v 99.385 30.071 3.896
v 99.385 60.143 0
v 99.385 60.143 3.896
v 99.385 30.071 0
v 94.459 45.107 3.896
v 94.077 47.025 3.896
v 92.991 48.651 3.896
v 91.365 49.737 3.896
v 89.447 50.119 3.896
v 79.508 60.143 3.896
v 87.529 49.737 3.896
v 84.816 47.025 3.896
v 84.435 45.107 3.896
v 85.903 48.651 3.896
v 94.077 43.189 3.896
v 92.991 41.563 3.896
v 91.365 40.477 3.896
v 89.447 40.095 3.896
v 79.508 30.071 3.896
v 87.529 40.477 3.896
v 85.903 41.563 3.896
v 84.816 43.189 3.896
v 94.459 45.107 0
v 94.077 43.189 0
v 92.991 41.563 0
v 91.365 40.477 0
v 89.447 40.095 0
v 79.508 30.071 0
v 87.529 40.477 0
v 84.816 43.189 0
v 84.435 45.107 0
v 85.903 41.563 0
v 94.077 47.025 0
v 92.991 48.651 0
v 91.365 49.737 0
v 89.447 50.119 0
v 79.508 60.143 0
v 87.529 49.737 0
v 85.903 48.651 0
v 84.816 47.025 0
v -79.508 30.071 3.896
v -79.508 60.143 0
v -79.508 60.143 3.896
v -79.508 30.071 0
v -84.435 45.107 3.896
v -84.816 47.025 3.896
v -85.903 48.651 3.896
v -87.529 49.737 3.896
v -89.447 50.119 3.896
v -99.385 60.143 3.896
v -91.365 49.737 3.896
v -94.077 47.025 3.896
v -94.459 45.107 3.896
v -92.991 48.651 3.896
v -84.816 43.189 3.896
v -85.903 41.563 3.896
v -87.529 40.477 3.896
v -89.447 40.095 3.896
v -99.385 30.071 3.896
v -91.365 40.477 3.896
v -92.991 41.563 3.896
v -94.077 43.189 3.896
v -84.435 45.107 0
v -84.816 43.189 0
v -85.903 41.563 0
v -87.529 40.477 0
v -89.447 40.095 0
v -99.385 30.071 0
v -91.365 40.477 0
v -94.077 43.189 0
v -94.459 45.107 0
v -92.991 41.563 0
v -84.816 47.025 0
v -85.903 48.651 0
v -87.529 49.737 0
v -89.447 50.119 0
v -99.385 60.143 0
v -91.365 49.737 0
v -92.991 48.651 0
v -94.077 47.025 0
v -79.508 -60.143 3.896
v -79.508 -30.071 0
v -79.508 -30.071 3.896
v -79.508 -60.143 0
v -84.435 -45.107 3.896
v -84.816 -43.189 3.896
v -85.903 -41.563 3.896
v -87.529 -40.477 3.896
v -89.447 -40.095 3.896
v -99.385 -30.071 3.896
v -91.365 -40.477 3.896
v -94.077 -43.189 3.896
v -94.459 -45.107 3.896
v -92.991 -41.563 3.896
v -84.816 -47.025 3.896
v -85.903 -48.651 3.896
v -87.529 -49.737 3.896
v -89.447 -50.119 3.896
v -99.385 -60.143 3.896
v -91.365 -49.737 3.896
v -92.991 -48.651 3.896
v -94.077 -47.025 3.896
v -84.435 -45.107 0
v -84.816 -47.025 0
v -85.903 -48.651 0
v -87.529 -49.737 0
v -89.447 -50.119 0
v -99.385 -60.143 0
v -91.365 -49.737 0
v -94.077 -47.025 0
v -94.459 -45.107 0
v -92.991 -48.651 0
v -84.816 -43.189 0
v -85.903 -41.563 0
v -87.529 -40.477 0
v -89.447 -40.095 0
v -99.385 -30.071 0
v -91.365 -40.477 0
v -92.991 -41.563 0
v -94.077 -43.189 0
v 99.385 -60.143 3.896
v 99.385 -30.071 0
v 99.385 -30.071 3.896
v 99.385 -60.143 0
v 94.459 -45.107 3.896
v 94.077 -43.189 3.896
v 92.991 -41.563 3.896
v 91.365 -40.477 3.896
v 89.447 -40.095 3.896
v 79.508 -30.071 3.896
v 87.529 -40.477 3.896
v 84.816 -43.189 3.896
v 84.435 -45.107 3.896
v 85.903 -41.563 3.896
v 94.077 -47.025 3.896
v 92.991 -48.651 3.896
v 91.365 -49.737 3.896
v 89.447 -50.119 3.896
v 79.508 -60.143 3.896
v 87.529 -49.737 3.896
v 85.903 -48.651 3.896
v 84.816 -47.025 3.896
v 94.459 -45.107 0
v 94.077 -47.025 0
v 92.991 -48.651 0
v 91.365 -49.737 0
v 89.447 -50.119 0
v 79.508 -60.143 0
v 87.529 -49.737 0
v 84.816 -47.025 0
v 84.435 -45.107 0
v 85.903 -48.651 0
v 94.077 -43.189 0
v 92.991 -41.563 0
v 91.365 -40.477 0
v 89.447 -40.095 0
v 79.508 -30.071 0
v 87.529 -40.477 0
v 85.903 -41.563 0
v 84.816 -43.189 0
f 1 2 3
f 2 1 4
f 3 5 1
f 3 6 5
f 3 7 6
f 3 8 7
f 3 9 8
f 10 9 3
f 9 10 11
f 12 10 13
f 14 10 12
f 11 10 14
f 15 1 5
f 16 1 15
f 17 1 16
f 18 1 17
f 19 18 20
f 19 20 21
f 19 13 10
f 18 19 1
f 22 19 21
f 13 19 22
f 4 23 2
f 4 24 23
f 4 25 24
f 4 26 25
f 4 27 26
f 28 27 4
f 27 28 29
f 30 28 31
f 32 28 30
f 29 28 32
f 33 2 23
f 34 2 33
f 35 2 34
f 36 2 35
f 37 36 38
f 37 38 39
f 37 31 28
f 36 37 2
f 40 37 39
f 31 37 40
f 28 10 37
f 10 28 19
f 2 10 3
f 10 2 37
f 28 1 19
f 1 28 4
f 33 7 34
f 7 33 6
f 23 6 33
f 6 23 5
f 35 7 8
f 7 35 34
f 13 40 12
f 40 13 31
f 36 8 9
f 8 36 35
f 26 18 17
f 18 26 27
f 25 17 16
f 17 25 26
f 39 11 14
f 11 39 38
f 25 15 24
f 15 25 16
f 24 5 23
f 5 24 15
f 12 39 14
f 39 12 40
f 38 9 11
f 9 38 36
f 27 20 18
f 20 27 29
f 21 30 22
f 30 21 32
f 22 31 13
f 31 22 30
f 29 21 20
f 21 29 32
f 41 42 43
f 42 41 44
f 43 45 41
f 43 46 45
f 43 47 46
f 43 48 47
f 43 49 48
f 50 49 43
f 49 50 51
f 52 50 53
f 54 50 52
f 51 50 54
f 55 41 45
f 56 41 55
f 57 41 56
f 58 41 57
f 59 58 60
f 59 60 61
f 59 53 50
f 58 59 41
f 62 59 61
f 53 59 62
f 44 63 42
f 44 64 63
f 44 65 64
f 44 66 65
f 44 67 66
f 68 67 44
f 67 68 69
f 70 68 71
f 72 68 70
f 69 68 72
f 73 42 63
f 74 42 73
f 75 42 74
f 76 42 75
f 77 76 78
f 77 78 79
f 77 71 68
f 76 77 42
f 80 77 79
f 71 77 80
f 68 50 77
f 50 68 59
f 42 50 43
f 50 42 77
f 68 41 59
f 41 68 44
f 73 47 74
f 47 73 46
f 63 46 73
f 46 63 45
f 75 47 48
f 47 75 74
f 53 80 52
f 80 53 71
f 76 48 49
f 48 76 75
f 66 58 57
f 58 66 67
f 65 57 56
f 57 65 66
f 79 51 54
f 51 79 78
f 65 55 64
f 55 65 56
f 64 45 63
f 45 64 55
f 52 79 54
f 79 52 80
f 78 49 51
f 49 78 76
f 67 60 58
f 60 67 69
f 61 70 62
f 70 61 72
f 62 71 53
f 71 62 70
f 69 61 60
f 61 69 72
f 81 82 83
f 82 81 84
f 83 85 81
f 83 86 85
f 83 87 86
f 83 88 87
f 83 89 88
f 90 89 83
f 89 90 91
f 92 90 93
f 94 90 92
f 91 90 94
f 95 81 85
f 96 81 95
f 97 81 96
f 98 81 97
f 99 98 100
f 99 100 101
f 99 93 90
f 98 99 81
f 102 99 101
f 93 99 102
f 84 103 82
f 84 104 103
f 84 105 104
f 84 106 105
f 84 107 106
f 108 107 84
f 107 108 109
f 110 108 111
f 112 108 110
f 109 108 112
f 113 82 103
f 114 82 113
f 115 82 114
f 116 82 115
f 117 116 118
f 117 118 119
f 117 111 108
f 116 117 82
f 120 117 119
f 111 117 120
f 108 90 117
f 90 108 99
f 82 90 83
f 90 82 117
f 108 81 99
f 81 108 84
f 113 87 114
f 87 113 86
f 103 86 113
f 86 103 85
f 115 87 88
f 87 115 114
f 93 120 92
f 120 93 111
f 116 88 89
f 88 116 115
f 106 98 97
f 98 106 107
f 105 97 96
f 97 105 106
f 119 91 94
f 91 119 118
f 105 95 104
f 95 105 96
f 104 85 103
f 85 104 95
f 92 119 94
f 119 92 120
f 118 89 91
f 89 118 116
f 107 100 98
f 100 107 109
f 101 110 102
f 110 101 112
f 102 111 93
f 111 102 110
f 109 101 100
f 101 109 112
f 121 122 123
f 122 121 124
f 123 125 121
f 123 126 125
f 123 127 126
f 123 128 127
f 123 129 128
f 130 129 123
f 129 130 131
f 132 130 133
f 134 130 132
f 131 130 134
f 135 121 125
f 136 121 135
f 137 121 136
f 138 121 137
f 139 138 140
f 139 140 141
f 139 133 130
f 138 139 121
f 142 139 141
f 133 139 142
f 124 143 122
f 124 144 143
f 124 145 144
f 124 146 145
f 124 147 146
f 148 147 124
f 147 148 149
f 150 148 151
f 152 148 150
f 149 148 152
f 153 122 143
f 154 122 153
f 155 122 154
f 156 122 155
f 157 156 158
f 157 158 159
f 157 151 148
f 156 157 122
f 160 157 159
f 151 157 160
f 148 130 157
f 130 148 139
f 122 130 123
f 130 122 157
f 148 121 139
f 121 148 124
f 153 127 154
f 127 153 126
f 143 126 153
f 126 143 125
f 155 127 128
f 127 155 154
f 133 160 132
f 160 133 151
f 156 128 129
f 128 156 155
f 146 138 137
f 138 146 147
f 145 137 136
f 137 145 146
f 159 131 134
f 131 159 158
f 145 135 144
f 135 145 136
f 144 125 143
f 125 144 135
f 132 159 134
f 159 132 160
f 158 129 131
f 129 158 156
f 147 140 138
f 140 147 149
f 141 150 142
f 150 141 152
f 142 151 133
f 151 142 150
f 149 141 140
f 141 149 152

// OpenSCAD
// file: 3dprinter.scad
//===============================================//
//===============================================//
//     BioDeploy SCAD file = 3dprinter.scad      //
//                 Start File                    //
//===============================================//
//===============================================//
//choose the max specs for your 3d printer
//here we use a replicator2x specs
x_print_max = 24.6*10;
y_print_max = 15.2*10;
z_print_max = 15.5*10;
//don't forget *10 to put unit in centimeters
//-----------------------------------------------//
//===============================================//
//===============================================//
//     BioDeploy SCAD file = 3dprinter.scad      //
//                   End  File                   //
//===============================================//
//===============================================//
// main file
//===============================================//
//===============================================//
//BioDeploy SCAD file = hydrolyseur_top_core_base_support.scad//
//                 Start File                    //
//===============================================//
//===============================================//
//-----------------------------------------------//
//===============================================//
//             3d printer parameters             //
//===============================================//
include <3dprinter.scad>
//===============================================//
//                 variables                     //
//===============================================//
include <hydrolyseur_variables.scad>
//===============================================//
//               Calls for use                   //
//===============================================//


//===============================================//
//                    Trees                      //
//===============================================//

module coin(){
difference() {
cube([x_h2o_top_int_fix,y_h2o_top_int_fix,z_h2o_top_int_fix], center = true);
cylinder(z_h2o_top_int_fix+z_h2o_top_int_fix/10,y_h2o_top_int_fix/6,y_h2o_top_int_fix/6, center = true);}}


module bitcoin() {
union() {
translate([x_sphere_int/2-x_h2o_top_int_fix/2,y_sphere_int/2-y_h2o_top_int_fix/2,z_h2o_top_int_fix/2])coin();
translate([-x_sphere_int/2+x_h2o_top_int_fix/2,y_sphere_int/2-y_h2o_top_int_fix/2,z_h2o_top_int_fix/2])coin();
translate([-x_sphere_int/2+x_h2o_top_int_fix/2,-y_sphere_int/2+y_h2o_top_int_fix/2,z_h2o_top_int_fix/2])coin();
translate([x_sphere_int/2-x_h2o_top_int_fix/2,-y_sphere_int/2+y_h2o_top_int_fix/2,z_h2o_top_int_fix/2])coin();}}

bitcoin();
//-----------------------------------------------//
//===============================================//
//===============================================//
//BioDeploy SCAD file = hydrolyseur_top_core_base_support.scad//
//                   End  File                   //
//===============================================//
//===============================================//
